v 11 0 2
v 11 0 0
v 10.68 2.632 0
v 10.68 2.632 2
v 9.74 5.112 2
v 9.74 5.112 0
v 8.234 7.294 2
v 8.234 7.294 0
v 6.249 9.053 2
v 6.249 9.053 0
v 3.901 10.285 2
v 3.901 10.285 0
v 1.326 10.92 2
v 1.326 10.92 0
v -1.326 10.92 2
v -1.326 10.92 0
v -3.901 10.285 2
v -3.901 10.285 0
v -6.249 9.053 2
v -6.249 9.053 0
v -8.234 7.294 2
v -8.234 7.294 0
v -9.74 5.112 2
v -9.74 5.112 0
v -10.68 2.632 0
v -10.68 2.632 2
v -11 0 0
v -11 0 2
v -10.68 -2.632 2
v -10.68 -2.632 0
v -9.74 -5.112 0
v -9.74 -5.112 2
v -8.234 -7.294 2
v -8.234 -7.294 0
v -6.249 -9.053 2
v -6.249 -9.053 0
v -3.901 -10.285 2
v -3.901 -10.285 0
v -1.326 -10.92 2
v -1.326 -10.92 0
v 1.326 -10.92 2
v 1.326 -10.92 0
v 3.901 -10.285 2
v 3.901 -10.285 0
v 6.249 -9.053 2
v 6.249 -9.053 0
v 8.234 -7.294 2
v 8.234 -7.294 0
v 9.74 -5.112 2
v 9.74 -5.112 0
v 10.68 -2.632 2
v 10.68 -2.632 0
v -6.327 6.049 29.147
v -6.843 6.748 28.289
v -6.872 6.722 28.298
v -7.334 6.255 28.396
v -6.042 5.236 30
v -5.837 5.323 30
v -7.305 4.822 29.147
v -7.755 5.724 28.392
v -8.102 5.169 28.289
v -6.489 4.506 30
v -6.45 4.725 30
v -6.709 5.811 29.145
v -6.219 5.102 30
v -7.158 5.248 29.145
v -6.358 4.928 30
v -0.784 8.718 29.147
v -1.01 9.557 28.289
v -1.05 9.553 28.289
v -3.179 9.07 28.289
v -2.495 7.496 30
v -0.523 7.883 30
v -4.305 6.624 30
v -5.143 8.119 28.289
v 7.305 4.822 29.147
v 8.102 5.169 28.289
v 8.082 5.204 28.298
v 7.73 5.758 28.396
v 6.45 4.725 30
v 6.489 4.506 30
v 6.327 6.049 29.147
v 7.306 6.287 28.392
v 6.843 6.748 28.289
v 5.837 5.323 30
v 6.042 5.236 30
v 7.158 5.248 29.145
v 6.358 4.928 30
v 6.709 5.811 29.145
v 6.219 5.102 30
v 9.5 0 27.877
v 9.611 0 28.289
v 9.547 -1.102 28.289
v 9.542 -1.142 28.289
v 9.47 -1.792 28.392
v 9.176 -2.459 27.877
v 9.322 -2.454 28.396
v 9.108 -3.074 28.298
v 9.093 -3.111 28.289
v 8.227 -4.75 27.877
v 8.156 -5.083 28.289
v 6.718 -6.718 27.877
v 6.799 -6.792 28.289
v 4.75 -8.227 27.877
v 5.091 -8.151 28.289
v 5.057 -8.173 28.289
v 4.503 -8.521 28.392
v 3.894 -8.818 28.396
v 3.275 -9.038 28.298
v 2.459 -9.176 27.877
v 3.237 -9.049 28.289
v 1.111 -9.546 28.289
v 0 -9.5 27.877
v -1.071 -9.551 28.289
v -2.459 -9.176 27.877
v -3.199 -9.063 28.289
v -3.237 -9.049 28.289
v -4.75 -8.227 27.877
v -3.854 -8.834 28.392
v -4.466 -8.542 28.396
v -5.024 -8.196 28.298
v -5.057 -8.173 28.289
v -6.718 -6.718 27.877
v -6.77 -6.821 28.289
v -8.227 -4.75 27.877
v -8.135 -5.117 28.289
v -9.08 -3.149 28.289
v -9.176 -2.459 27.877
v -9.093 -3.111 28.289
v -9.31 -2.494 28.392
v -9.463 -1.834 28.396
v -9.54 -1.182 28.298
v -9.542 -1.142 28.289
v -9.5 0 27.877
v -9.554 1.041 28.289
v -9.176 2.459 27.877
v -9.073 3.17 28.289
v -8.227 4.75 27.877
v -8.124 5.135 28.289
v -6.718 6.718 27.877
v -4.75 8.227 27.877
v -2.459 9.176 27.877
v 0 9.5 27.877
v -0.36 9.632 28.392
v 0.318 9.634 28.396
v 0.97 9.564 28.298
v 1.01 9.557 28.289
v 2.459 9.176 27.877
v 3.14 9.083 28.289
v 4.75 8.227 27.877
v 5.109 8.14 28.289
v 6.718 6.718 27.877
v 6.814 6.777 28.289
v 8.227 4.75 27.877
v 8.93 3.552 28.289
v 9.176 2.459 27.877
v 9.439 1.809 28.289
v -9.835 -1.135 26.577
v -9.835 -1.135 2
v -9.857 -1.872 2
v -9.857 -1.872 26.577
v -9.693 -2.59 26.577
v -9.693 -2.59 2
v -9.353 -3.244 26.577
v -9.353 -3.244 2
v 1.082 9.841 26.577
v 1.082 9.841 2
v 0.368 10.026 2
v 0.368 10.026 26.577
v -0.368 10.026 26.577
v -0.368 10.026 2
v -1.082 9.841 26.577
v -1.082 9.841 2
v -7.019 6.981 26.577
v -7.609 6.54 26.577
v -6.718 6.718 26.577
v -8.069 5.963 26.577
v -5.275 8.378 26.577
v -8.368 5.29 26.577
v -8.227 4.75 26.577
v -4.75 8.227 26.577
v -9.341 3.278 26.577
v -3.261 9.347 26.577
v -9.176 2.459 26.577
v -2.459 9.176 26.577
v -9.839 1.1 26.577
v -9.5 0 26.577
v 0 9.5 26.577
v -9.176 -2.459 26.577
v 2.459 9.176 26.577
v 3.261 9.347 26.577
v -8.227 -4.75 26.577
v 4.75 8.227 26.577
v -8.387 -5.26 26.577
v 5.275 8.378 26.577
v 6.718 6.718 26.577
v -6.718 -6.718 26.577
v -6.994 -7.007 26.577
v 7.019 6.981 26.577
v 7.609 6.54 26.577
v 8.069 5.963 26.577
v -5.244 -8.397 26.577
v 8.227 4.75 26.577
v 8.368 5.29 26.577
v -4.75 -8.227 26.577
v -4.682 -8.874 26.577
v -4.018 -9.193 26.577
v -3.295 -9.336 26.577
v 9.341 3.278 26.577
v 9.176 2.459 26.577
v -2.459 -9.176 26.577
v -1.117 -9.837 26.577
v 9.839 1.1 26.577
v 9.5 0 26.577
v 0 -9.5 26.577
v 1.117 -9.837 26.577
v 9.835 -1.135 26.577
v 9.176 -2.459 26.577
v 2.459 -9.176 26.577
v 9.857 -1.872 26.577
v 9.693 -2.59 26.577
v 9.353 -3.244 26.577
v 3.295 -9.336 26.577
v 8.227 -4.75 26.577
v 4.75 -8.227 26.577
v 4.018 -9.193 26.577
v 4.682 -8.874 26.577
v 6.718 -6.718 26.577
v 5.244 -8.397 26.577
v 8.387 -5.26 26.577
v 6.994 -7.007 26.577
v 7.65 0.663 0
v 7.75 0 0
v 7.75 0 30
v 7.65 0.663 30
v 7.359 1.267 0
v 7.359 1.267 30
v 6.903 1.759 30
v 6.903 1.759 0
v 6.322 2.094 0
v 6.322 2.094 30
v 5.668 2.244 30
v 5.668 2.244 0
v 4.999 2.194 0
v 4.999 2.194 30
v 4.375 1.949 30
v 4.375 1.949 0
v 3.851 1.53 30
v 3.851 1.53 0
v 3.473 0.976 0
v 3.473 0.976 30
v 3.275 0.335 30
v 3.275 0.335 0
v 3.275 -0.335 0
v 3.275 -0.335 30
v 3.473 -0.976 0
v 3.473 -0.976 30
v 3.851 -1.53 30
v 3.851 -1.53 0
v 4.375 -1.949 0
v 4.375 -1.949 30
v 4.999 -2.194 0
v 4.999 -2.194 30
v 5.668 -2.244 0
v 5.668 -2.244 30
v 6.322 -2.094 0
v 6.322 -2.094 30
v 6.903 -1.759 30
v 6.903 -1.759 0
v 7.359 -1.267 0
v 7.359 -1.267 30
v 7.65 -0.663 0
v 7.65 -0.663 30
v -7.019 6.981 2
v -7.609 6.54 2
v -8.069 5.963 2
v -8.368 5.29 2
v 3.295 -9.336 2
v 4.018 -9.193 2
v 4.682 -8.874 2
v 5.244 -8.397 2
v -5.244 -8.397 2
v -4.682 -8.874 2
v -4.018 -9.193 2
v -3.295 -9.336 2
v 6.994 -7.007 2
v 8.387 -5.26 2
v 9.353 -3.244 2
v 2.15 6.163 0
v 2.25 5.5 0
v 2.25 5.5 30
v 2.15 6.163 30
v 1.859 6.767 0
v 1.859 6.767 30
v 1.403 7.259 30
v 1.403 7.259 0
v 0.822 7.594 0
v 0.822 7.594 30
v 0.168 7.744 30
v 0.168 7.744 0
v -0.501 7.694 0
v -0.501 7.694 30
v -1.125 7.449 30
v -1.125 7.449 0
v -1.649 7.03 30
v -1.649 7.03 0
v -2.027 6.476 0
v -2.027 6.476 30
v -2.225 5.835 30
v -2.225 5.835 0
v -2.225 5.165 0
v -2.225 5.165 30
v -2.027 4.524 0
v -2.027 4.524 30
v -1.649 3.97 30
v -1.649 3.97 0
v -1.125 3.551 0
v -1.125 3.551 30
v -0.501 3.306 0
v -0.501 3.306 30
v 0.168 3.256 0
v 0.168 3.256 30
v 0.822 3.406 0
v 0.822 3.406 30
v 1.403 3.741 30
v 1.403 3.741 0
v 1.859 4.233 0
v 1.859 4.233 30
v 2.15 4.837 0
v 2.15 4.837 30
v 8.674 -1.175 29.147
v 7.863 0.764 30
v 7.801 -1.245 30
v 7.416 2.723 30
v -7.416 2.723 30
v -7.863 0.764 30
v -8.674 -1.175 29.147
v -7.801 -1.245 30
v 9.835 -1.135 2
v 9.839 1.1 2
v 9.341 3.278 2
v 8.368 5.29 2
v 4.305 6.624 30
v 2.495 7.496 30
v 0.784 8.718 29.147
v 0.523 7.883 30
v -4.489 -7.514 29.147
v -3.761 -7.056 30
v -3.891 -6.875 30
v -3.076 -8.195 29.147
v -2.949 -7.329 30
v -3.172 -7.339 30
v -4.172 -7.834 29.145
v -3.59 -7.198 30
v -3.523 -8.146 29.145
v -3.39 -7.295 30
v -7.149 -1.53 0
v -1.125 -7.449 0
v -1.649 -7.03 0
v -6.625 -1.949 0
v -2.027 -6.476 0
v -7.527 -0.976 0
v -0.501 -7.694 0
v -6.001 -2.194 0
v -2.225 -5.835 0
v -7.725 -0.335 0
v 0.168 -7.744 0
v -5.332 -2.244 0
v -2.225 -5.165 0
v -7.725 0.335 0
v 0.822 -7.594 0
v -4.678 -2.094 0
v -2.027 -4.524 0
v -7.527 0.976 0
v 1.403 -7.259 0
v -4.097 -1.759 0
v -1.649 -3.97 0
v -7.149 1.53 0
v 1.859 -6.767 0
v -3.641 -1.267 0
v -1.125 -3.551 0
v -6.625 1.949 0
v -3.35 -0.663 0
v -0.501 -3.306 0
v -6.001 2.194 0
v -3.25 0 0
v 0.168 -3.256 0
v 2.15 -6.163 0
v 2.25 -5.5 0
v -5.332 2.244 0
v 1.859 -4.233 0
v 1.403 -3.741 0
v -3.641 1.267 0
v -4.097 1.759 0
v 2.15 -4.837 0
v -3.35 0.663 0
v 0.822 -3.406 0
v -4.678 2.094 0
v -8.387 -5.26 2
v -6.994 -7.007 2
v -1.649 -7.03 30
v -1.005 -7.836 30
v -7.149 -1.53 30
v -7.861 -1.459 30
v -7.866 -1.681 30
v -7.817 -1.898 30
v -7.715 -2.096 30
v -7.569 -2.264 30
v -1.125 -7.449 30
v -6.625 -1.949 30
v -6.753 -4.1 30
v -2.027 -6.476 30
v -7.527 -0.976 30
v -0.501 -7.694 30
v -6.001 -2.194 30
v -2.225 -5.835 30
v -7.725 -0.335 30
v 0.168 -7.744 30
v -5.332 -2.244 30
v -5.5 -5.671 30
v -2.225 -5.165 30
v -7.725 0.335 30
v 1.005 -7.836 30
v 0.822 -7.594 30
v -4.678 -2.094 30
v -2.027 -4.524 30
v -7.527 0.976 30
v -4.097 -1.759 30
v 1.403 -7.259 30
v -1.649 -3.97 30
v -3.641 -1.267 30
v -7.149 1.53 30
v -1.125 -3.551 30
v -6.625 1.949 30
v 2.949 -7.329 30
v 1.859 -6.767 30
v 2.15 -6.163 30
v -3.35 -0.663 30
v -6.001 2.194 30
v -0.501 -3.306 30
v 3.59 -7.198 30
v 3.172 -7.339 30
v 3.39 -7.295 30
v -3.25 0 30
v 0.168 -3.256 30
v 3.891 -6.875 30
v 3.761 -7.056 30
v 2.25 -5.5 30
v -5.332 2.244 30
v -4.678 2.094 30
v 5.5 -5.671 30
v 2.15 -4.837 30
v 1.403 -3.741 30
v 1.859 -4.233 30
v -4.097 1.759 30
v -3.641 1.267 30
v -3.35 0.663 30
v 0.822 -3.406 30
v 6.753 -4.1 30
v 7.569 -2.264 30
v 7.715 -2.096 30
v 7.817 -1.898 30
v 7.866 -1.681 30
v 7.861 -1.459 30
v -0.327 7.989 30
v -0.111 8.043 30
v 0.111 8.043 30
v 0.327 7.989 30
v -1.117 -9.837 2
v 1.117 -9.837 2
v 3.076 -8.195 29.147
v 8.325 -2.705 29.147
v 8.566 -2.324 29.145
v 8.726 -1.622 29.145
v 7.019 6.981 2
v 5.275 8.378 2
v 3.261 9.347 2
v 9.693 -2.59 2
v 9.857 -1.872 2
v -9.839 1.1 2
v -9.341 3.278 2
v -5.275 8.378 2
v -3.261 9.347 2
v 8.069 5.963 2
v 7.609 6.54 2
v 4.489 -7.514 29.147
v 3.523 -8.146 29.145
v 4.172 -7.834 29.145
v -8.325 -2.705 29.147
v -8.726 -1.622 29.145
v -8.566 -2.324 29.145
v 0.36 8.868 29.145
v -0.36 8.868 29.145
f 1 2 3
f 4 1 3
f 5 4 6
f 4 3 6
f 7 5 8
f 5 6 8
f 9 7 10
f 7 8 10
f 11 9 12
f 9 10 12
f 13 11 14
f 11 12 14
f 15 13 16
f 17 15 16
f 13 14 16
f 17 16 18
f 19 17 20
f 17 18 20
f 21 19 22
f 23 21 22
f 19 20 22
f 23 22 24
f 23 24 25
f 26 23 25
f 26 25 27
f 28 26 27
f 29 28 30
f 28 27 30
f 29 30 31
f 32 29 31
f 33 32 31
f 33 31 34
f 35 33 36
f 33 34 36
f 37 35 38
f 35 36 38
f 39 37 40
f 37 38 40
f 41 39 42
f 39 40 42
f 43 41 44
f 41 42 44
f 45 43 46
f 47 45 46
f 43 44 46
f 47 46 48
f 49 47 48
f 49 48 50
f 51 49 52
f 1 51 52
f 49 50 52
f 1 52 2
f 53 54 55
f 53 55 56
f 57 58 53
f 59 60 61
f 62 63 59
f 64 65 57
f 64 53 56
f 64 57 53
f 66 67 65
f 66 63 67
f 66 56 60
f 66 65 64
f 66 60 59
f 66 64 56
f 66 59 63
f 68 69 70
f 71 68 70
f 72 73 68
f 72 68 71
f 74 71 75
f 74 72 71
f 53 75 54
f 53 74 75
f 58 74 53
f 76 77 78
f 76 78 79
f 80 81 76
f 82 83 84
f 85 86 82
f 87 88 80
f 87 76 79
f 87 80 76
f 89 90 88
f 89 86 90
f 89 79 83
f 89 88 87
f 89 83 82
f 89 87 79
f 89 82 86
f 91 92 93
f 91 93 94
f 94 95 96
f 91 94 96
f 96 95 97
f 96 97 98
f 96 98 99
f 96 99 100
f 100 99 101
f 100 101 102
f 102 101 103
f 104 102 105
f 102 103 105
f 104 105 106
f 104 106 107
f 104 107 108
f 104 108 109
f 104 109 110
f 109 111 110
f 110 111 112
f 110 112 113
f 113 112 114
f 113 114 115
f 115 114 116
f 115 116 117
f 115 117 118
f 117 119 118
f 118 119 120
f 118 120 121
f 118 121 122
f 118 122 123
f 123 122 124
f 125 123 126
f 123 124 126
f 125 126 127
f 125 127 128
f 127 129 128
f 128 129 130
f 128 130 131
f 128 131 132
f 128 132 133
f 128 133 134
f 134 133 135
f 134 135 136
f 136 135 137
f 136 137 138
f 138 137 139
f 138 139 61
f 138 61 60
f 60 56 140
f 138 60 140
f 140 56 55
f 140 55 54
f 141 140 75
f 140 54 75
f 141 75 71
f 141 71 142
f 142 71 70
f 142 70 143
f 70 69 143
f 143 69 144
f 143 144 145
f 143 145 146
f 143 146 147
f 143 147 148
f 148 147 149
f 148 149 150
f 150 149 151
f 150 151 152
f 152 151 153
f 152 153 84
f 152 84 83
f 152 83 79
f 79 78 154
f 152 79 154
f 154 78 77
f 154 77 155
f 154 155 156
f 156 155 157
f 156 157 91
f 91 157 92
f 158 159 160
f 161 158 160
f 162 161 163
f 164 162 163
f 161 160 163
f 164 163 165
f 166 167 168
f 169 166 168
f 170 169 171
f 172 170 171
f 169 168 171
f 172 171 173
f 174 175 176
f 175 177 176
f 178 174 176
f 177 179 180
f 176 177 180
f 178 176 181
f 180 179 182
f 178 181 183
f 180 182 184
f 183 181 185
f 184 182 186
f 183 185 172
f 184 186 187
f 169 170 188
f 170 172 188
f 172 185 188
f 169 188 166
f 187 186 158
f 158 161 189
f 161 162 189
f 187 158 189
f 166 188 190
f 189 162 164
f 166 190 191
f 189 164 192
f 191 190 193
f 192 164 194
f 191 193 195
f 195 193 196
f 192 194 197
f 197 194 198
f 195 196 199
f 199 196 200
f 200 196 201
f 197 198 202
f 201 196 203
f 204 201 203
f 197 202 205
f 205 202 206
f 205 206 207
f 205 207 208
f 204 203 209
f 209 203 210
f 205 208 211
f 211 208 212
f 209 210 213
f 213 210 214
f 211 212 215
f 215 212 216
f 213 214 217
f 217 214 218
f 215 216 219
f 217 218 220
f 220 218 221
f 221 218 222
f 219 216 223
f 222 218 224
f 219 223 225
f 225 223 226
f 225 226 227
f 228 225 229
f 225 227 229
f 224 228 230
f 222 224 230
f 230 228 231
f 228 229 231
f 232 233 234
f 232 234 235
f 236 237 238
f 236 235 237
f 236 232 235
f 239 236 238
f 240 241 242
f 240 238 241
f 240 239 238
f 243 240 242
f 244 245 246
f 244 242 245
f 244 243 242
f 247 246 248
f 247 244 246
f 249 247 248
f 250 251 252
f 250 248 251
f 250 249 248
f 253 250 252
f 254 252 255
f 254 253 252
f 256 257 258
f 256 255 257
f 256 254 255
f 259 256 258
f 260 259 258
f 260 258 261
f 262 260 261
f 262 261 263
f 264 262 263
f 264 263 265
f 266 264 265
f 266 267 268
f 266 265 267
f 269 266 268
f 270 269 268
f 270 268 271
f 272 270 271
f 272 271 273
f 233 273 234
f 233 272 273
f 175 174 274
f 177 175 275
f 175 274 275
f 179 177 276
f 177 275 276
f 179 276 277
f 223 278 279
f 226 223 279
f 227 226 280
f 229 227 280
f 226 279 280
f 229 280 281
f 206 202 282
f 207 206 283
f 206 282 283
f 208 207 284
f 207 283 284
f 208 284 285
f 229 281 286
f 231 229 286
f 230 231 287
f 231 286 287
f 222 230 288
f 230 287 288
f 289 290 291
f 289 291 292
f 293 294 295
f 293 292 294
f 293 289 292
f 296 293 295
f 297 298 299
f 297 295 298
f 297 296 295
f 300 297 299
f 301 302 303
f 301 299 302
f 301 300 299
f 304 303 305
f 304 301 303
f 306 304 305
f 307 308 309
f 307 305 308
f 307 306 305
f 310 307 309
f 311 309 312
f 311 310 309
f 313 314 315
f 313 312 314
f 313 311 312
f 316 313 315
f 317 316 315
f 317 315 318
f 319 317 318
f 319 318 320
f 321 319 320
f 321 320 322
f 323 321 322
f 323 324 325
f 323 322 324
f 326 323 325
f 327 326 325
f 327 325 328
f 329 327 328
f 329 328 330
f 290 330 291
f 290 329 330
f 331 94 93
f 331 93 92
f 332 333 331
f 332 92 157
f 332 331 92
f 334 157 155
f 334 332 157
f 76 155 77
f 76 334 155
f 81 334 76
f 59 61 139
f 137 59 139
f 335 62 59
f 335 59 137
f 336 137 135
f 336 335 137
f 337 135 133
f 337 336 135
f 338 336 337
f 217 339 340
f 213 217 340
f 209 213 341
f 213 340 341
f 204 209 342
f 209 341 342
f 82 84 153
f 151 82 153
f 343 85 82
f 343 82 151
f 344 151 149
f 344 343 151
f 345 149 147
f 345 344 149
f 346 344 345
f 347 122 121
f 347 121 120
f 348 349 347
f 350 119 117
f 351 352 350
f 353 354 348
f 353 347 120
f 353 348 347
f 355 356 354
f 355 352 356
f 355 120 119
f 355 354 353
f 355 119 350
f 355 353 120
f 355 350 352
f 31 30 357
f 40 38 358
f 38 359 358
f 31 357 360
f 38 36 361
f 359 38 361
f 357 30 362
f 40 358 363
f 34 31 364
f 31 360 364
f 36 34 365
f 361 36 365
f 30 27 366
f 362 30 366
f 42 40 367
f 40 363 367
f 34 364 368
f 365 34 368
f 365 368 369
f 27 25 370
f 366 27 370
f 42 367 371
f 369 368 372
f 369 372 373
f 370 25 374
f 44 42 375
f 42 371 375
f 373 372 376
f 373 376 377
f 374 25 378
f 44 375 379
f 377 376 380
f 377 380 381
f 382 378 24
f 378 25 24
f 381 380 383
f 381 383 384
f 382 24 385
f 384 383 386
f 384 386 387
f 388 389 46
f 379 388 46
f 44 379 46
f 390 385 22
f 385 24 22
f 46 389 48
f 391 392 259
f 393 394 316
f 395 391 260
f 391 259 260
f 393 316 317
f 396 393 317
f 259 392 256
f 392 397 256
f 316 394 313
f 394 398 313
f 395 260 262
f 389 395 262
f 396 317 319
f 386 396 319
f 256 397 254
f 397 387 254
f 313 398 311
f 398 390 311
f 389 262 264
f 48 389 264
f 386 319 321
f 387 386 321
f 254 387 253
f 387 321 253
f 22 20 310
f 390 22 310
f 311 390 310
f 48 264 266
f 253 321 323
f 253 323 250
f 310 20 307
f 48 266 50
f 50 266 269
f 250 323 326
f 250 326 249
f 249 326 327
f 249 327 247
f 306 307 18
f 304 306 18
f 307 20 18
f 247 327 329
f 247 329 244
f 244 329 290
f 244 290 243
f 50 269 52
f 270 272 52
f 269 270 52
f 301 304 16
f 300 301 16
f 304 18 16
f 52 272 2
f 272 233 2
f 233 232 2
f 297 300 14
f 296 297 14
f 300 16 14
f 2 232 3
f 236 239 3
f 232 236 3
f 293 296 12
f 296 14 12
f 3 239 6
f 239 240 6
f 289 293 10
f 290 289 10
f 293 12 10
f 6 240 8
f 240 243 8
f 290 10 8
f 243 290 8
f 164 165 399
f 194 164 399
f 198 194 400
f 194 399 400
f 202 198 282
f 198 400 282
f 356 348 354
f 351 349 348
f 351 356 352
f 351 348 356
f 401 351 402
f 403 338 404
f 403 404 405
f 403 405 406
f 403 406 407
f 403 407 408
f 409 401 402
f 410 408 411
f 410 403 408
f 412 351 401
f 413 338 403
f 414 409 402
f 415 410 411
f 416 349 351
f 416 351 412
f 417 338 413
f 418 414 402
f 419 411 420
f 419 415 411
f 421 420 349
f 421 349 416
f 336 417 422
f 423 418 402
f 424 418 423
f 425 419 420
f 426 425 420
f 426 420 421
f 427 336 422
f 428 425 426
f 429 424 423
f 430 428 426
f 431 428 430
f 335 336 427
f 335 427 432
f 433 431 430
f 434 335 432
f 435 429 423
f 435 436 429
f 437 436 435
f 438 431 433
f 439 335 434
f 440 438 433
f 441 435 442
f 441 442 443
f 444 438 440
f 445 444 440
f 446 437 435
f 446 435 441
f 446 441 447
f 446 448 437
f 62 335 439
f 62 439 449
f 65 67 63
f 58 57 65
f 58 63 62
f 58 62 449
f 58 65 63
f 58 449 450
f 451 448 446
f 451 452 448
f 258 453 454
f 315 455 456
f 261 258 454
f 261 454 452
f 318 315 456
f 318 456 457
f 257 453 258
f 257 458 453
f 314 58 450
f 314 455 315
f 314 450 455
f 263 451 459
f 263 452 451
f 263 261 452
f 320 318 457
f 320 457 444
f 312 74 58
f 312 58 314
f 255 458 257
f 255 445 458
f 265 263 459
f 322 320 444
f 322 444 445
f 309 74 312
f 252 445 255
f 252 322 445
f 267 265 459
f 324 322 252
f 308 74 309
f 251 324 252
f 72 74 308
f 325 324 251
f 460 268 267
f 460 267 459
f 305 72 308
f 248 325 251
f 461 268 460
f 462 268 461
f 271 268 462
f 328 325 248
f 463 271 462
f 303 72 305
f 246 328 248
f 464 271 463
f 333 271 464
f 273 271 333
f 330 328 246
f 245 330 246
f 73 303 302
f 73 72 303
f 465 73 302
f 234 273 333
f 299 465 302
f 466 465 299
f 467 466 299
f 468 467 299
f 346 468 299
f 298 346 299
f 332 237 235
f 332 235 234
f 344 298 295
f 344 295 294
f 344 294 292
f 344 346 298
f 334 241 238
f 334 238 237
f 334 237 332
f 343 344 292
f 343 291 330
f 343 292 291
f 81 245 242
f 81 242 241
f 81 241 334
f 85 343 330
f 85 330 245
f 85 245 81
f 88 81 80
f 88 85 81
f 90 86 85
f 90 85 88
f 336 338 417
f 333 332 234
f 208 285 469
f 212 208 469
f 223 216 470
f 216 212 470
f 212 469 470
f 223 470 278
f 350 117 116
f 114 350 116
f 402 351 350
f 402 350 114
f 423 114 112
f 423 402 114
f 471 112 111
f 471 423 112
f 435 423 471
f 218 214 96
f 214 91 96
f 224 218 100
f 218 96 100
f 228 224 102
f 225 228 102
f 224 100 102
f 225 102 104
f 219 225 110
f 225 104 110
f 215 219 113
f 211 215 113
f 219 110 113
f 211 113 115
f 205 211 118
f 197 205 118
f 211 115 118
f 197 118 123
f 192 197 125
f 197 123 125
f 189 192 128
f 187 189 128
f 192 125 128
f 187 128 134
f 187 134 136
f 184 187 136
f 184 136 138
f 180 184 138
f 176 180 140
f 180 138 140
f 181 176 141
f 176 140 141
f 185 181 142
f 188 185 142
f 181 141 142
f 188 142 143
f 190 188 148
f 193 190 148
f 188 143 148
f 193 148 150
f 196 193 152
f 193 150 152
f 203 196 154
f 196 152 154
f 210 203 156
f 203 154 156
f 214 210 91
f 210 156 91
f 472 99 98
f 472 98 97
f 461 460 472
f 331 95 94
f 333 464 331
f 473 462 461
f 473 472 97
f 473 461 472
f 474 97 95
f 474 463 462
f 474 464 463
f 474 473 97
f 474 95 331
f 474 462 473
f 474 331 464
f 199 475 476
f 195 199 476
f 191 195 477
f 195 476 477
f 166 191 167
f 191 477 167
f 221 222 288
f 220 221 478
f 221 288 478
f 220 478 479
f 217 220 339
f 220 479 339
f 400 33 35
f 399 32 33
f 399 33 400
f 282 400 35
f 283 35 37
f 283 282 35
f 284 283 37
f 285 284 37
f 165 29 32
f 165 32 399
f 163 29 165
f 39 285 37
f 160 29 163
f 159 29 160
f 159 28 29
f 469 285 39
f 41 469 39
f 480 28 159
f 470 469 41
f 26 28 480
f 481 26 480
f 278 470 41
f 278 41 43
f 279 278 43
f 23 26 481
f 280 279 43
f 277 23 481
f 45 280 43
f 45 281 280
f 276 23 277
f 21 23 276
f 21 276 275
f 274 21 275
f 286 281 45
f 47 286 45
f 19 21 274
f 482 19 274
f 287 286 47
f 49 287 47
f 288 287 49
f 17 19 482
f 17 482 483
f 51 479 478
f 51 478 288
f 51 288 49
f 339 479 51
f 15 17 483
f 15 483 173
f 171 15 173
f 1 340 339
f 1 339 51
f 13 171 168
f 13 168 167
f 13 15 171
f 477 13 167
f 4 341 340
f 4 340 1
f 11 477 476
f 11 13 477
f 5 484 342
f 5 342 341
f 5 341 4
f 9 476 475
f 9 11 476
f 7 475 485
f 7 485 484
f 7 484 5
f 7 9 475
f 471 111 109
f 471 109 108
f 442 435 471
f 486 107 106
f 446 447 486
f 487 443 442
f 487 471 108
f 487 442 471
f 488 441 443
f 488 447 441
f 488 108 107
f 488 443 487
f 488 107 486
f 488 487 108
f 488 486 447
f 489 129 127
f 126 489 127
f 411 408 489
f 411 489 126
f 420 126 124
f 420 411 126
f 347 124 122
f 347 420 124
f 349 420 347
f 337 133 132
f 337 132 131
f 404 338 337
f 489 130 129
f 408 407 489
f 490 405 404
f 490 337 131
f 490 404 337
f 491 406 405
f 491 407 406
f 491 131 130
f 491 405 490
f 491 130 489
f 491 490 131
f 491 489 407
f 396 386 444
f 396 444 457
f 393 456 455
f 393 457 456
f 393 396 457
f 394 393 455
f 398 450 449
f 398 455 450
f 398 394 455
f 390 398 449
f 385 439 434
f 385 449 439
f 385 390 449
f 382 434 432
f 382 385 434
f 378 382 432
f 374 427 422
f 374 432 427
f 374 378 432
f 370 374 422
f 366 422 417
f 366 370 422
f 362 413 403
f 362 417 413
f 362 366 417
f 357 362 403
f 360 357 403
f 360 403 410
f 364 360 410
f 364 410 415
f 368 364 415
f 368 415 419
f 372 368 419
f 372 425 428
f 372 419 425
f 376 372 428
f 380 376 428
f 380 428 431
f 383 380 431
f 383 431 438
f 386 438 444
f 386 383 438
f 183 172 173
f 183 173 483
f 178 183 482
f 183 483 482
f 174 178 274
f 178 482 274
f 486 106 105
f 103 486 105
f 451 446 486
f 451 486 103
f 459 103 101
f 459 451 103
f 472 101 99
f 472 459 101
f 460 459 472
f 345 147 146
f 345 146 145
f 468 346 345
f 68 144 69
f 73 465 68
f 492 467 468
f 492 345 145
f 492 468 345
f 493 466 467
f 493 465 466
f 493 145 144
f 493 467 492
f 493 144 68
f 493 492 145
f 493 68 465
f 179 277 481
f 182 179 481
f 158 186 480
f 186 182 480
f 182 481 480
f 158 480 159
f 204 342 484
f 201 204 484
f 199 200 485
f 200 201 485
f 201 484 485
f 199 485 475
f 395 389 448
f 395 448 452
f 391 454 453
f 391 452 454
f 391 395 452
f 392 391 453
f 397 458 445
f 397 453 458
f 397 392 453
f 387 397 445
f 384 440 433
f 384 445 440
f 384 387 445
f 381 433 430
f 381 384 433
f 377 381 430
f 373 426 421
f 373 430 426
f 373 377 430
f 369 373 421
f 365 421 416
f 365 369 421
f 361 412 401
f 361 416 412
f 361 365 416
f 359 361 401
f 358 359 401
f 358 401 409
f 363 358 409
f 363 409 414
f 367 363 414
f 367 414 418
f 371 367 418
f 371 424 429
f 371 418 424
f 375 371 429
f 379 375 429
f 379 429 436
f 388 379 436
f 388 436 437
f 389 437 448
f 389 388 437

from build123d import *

# Parameters (mm, degrees)
AUFSATZ_LINEAR_AUSTRAGEN1_DEPTH      = 30
SKIZZE2_R                            = 11
AUFSATZ_LINEAR_AUSTRAGEN2_DEPTH      = 2
FASE1_SIZE                           = 2
SCHNITT_LINEAR_AUSTRAGEN1_DEPTH      = 33.031234844
SCHNITT_LINEAR_AUSTRAGEN1_DEPTH_BACK = 33.031234844
SKIZZE3_R                            = 2.25


with BuildPart() as part:
    # Skizze1 → Aufsatz-Linear austragen1 (new body)
    with BuildSketch(Plane.XY):
        with BuildLine():
            ThreePointArc((9.834694469, -1.13524654), (9.651786331, 2.202957246), (8.368188528, 5.289935799))
            ThreePointArc((8.368188528, 5.289935799), (7.857406399, 6.266072509), (7.019403191, 6.981259116))
            ThreePointArc((7.019403191, 6.981259116), (4.295449017, 8.919591792), (1.081641859, 9.840734266))
            ThreePointArc((1.081641859, 9.840734266), (0, 10.05), (-1.081641859, 9.840734266))
            ThreePointArc((-1.081641859, 9.840734266), (-4.295449017, 8.919591792), (-7.019403191, 6.981259116))
            ThreePointArc((-7.019403191, 6.981259116), (-7.857406399, 6.266072509), (-8.368188528, 5.289935799))
            ThreePointArc((-8.368188528, 5.289935799), (-9.651786331, 2.202957246), (-9.834694469, -1.13524654))
            ThreePointArc((-9.834694469, -1.13524654), (-9.798025517, -2.236335386), (-9.353318555, -3.244292219))
            ThreePointArc((-9.353318555, -3.244292219), (-7.740131676, -6.172549038), (-5.24426022, -8.396888397))
            ThreePointArc((-5.24426022, -8.396888397), (-4.360531578, -9.054737122), (-3.295208938, -9.335502025))
            ThreePointArc((-3.295208938, -9.335502025), (0, -9.9), (3.295208938, -9.335502025))
            ThreePointArc((3.295208938, -9.335502025), (4.360531578, -9.054737122), (5.24426022, -8.396888397))
            ThreePointArc((5.24426022, -8.396888397), (7.740131676, -6.172549038), (9.353318555, -3.244292219))
            ThreePointArc((9.353318555, -3.244292219), (9.798025517, -2.236335386), (9.834694469, -1.13524654))
        make_face()
    extrude(amount=AUFSATZ_LINEAR_AUSTRAGEN1_DEPTH)

    # Skizze2 → Aufsatz-Linear austragen2 (add)
    with BuildSketch(Plane.XY):
        Circle(SKIZZE2_R)
    extrude(amount=AUFSATZ_LINEAR_AUSTRAGEN2_DEPTH)

    # Fase1
    fase1_edges = [part.edges().sort_by_distance(p)[0] for p in [
        (9.798025517, -2.236335386, 30),
        (7.740131676, -6.172549038, 30),
        (4.360531578, -9.054737122, 30),
        (0, -9.9, 30),
        (-4.360531578, -9.054737122, 30),
        (-7.740131676, -6.172549038, 30),
        (-9.798025517, -2.236335386, 30),
        (-9.651786331, 2.202957246, 30),
        (-7.857406399, 6.266072509, 30),
        (-4.295449017, 8.919591792, 30),
        (0, 10.05, 30),
        (4.295449017, 8.919591792, 30),
        (7.857406399, 6.266072509, 30),
        (9.651786331, 2.202957246, 30),
    ]]
    chamfer(fase1_edges, length=FASE1_SIZE)

    # Skizze3 → Schnitt-Linear austragen1 (cut, two sides: drawn at the far end of the back side and taken through both)
    with BuildSketch(Plane.XY.offset(2).offset(-SCHNITT_LINEAR_AUSTRAGEN1_DEPTH_BACK)):
        with Locations((0, 5.5)):
            Circle(SKIZZE3_R)
        with Locations((5.5, 0)):
            Circle(SKIZZE3_R)
        with Locations((0, -5.5)):
            Circle(SKIZZE3_R)
        with Locations((-5.5, 0)):
            Circle(SKIZZE3_R)
    extrude(amount=SCHNITT_LINEAR_AUSTRAGEN1_DEPTH + SCHNITT_LINEAR_AUSTRAGEN1_DEPTH_BACK, mode=Mode.SUBTRACT)

    # Skizze4 → Schnitt-Rotation1 (revolve, cut)
    with BuildSketch(Plane(origin=(0, 0, 0), x_dir=(0, 0, -1), z_dir=(1, 0, 0))):
        Polygon((-27.876581368, 10.05), (-26.576581368, 10.05), (-26.576581368, 9.5), (-27.876581368, 9.5), (-29.929209312, 10.05), align=None)
    revolve(axis=Axis((0, 0, 0), (0, 0, -1)), mode=Mode.SUBTRACT)


solid = part.part
